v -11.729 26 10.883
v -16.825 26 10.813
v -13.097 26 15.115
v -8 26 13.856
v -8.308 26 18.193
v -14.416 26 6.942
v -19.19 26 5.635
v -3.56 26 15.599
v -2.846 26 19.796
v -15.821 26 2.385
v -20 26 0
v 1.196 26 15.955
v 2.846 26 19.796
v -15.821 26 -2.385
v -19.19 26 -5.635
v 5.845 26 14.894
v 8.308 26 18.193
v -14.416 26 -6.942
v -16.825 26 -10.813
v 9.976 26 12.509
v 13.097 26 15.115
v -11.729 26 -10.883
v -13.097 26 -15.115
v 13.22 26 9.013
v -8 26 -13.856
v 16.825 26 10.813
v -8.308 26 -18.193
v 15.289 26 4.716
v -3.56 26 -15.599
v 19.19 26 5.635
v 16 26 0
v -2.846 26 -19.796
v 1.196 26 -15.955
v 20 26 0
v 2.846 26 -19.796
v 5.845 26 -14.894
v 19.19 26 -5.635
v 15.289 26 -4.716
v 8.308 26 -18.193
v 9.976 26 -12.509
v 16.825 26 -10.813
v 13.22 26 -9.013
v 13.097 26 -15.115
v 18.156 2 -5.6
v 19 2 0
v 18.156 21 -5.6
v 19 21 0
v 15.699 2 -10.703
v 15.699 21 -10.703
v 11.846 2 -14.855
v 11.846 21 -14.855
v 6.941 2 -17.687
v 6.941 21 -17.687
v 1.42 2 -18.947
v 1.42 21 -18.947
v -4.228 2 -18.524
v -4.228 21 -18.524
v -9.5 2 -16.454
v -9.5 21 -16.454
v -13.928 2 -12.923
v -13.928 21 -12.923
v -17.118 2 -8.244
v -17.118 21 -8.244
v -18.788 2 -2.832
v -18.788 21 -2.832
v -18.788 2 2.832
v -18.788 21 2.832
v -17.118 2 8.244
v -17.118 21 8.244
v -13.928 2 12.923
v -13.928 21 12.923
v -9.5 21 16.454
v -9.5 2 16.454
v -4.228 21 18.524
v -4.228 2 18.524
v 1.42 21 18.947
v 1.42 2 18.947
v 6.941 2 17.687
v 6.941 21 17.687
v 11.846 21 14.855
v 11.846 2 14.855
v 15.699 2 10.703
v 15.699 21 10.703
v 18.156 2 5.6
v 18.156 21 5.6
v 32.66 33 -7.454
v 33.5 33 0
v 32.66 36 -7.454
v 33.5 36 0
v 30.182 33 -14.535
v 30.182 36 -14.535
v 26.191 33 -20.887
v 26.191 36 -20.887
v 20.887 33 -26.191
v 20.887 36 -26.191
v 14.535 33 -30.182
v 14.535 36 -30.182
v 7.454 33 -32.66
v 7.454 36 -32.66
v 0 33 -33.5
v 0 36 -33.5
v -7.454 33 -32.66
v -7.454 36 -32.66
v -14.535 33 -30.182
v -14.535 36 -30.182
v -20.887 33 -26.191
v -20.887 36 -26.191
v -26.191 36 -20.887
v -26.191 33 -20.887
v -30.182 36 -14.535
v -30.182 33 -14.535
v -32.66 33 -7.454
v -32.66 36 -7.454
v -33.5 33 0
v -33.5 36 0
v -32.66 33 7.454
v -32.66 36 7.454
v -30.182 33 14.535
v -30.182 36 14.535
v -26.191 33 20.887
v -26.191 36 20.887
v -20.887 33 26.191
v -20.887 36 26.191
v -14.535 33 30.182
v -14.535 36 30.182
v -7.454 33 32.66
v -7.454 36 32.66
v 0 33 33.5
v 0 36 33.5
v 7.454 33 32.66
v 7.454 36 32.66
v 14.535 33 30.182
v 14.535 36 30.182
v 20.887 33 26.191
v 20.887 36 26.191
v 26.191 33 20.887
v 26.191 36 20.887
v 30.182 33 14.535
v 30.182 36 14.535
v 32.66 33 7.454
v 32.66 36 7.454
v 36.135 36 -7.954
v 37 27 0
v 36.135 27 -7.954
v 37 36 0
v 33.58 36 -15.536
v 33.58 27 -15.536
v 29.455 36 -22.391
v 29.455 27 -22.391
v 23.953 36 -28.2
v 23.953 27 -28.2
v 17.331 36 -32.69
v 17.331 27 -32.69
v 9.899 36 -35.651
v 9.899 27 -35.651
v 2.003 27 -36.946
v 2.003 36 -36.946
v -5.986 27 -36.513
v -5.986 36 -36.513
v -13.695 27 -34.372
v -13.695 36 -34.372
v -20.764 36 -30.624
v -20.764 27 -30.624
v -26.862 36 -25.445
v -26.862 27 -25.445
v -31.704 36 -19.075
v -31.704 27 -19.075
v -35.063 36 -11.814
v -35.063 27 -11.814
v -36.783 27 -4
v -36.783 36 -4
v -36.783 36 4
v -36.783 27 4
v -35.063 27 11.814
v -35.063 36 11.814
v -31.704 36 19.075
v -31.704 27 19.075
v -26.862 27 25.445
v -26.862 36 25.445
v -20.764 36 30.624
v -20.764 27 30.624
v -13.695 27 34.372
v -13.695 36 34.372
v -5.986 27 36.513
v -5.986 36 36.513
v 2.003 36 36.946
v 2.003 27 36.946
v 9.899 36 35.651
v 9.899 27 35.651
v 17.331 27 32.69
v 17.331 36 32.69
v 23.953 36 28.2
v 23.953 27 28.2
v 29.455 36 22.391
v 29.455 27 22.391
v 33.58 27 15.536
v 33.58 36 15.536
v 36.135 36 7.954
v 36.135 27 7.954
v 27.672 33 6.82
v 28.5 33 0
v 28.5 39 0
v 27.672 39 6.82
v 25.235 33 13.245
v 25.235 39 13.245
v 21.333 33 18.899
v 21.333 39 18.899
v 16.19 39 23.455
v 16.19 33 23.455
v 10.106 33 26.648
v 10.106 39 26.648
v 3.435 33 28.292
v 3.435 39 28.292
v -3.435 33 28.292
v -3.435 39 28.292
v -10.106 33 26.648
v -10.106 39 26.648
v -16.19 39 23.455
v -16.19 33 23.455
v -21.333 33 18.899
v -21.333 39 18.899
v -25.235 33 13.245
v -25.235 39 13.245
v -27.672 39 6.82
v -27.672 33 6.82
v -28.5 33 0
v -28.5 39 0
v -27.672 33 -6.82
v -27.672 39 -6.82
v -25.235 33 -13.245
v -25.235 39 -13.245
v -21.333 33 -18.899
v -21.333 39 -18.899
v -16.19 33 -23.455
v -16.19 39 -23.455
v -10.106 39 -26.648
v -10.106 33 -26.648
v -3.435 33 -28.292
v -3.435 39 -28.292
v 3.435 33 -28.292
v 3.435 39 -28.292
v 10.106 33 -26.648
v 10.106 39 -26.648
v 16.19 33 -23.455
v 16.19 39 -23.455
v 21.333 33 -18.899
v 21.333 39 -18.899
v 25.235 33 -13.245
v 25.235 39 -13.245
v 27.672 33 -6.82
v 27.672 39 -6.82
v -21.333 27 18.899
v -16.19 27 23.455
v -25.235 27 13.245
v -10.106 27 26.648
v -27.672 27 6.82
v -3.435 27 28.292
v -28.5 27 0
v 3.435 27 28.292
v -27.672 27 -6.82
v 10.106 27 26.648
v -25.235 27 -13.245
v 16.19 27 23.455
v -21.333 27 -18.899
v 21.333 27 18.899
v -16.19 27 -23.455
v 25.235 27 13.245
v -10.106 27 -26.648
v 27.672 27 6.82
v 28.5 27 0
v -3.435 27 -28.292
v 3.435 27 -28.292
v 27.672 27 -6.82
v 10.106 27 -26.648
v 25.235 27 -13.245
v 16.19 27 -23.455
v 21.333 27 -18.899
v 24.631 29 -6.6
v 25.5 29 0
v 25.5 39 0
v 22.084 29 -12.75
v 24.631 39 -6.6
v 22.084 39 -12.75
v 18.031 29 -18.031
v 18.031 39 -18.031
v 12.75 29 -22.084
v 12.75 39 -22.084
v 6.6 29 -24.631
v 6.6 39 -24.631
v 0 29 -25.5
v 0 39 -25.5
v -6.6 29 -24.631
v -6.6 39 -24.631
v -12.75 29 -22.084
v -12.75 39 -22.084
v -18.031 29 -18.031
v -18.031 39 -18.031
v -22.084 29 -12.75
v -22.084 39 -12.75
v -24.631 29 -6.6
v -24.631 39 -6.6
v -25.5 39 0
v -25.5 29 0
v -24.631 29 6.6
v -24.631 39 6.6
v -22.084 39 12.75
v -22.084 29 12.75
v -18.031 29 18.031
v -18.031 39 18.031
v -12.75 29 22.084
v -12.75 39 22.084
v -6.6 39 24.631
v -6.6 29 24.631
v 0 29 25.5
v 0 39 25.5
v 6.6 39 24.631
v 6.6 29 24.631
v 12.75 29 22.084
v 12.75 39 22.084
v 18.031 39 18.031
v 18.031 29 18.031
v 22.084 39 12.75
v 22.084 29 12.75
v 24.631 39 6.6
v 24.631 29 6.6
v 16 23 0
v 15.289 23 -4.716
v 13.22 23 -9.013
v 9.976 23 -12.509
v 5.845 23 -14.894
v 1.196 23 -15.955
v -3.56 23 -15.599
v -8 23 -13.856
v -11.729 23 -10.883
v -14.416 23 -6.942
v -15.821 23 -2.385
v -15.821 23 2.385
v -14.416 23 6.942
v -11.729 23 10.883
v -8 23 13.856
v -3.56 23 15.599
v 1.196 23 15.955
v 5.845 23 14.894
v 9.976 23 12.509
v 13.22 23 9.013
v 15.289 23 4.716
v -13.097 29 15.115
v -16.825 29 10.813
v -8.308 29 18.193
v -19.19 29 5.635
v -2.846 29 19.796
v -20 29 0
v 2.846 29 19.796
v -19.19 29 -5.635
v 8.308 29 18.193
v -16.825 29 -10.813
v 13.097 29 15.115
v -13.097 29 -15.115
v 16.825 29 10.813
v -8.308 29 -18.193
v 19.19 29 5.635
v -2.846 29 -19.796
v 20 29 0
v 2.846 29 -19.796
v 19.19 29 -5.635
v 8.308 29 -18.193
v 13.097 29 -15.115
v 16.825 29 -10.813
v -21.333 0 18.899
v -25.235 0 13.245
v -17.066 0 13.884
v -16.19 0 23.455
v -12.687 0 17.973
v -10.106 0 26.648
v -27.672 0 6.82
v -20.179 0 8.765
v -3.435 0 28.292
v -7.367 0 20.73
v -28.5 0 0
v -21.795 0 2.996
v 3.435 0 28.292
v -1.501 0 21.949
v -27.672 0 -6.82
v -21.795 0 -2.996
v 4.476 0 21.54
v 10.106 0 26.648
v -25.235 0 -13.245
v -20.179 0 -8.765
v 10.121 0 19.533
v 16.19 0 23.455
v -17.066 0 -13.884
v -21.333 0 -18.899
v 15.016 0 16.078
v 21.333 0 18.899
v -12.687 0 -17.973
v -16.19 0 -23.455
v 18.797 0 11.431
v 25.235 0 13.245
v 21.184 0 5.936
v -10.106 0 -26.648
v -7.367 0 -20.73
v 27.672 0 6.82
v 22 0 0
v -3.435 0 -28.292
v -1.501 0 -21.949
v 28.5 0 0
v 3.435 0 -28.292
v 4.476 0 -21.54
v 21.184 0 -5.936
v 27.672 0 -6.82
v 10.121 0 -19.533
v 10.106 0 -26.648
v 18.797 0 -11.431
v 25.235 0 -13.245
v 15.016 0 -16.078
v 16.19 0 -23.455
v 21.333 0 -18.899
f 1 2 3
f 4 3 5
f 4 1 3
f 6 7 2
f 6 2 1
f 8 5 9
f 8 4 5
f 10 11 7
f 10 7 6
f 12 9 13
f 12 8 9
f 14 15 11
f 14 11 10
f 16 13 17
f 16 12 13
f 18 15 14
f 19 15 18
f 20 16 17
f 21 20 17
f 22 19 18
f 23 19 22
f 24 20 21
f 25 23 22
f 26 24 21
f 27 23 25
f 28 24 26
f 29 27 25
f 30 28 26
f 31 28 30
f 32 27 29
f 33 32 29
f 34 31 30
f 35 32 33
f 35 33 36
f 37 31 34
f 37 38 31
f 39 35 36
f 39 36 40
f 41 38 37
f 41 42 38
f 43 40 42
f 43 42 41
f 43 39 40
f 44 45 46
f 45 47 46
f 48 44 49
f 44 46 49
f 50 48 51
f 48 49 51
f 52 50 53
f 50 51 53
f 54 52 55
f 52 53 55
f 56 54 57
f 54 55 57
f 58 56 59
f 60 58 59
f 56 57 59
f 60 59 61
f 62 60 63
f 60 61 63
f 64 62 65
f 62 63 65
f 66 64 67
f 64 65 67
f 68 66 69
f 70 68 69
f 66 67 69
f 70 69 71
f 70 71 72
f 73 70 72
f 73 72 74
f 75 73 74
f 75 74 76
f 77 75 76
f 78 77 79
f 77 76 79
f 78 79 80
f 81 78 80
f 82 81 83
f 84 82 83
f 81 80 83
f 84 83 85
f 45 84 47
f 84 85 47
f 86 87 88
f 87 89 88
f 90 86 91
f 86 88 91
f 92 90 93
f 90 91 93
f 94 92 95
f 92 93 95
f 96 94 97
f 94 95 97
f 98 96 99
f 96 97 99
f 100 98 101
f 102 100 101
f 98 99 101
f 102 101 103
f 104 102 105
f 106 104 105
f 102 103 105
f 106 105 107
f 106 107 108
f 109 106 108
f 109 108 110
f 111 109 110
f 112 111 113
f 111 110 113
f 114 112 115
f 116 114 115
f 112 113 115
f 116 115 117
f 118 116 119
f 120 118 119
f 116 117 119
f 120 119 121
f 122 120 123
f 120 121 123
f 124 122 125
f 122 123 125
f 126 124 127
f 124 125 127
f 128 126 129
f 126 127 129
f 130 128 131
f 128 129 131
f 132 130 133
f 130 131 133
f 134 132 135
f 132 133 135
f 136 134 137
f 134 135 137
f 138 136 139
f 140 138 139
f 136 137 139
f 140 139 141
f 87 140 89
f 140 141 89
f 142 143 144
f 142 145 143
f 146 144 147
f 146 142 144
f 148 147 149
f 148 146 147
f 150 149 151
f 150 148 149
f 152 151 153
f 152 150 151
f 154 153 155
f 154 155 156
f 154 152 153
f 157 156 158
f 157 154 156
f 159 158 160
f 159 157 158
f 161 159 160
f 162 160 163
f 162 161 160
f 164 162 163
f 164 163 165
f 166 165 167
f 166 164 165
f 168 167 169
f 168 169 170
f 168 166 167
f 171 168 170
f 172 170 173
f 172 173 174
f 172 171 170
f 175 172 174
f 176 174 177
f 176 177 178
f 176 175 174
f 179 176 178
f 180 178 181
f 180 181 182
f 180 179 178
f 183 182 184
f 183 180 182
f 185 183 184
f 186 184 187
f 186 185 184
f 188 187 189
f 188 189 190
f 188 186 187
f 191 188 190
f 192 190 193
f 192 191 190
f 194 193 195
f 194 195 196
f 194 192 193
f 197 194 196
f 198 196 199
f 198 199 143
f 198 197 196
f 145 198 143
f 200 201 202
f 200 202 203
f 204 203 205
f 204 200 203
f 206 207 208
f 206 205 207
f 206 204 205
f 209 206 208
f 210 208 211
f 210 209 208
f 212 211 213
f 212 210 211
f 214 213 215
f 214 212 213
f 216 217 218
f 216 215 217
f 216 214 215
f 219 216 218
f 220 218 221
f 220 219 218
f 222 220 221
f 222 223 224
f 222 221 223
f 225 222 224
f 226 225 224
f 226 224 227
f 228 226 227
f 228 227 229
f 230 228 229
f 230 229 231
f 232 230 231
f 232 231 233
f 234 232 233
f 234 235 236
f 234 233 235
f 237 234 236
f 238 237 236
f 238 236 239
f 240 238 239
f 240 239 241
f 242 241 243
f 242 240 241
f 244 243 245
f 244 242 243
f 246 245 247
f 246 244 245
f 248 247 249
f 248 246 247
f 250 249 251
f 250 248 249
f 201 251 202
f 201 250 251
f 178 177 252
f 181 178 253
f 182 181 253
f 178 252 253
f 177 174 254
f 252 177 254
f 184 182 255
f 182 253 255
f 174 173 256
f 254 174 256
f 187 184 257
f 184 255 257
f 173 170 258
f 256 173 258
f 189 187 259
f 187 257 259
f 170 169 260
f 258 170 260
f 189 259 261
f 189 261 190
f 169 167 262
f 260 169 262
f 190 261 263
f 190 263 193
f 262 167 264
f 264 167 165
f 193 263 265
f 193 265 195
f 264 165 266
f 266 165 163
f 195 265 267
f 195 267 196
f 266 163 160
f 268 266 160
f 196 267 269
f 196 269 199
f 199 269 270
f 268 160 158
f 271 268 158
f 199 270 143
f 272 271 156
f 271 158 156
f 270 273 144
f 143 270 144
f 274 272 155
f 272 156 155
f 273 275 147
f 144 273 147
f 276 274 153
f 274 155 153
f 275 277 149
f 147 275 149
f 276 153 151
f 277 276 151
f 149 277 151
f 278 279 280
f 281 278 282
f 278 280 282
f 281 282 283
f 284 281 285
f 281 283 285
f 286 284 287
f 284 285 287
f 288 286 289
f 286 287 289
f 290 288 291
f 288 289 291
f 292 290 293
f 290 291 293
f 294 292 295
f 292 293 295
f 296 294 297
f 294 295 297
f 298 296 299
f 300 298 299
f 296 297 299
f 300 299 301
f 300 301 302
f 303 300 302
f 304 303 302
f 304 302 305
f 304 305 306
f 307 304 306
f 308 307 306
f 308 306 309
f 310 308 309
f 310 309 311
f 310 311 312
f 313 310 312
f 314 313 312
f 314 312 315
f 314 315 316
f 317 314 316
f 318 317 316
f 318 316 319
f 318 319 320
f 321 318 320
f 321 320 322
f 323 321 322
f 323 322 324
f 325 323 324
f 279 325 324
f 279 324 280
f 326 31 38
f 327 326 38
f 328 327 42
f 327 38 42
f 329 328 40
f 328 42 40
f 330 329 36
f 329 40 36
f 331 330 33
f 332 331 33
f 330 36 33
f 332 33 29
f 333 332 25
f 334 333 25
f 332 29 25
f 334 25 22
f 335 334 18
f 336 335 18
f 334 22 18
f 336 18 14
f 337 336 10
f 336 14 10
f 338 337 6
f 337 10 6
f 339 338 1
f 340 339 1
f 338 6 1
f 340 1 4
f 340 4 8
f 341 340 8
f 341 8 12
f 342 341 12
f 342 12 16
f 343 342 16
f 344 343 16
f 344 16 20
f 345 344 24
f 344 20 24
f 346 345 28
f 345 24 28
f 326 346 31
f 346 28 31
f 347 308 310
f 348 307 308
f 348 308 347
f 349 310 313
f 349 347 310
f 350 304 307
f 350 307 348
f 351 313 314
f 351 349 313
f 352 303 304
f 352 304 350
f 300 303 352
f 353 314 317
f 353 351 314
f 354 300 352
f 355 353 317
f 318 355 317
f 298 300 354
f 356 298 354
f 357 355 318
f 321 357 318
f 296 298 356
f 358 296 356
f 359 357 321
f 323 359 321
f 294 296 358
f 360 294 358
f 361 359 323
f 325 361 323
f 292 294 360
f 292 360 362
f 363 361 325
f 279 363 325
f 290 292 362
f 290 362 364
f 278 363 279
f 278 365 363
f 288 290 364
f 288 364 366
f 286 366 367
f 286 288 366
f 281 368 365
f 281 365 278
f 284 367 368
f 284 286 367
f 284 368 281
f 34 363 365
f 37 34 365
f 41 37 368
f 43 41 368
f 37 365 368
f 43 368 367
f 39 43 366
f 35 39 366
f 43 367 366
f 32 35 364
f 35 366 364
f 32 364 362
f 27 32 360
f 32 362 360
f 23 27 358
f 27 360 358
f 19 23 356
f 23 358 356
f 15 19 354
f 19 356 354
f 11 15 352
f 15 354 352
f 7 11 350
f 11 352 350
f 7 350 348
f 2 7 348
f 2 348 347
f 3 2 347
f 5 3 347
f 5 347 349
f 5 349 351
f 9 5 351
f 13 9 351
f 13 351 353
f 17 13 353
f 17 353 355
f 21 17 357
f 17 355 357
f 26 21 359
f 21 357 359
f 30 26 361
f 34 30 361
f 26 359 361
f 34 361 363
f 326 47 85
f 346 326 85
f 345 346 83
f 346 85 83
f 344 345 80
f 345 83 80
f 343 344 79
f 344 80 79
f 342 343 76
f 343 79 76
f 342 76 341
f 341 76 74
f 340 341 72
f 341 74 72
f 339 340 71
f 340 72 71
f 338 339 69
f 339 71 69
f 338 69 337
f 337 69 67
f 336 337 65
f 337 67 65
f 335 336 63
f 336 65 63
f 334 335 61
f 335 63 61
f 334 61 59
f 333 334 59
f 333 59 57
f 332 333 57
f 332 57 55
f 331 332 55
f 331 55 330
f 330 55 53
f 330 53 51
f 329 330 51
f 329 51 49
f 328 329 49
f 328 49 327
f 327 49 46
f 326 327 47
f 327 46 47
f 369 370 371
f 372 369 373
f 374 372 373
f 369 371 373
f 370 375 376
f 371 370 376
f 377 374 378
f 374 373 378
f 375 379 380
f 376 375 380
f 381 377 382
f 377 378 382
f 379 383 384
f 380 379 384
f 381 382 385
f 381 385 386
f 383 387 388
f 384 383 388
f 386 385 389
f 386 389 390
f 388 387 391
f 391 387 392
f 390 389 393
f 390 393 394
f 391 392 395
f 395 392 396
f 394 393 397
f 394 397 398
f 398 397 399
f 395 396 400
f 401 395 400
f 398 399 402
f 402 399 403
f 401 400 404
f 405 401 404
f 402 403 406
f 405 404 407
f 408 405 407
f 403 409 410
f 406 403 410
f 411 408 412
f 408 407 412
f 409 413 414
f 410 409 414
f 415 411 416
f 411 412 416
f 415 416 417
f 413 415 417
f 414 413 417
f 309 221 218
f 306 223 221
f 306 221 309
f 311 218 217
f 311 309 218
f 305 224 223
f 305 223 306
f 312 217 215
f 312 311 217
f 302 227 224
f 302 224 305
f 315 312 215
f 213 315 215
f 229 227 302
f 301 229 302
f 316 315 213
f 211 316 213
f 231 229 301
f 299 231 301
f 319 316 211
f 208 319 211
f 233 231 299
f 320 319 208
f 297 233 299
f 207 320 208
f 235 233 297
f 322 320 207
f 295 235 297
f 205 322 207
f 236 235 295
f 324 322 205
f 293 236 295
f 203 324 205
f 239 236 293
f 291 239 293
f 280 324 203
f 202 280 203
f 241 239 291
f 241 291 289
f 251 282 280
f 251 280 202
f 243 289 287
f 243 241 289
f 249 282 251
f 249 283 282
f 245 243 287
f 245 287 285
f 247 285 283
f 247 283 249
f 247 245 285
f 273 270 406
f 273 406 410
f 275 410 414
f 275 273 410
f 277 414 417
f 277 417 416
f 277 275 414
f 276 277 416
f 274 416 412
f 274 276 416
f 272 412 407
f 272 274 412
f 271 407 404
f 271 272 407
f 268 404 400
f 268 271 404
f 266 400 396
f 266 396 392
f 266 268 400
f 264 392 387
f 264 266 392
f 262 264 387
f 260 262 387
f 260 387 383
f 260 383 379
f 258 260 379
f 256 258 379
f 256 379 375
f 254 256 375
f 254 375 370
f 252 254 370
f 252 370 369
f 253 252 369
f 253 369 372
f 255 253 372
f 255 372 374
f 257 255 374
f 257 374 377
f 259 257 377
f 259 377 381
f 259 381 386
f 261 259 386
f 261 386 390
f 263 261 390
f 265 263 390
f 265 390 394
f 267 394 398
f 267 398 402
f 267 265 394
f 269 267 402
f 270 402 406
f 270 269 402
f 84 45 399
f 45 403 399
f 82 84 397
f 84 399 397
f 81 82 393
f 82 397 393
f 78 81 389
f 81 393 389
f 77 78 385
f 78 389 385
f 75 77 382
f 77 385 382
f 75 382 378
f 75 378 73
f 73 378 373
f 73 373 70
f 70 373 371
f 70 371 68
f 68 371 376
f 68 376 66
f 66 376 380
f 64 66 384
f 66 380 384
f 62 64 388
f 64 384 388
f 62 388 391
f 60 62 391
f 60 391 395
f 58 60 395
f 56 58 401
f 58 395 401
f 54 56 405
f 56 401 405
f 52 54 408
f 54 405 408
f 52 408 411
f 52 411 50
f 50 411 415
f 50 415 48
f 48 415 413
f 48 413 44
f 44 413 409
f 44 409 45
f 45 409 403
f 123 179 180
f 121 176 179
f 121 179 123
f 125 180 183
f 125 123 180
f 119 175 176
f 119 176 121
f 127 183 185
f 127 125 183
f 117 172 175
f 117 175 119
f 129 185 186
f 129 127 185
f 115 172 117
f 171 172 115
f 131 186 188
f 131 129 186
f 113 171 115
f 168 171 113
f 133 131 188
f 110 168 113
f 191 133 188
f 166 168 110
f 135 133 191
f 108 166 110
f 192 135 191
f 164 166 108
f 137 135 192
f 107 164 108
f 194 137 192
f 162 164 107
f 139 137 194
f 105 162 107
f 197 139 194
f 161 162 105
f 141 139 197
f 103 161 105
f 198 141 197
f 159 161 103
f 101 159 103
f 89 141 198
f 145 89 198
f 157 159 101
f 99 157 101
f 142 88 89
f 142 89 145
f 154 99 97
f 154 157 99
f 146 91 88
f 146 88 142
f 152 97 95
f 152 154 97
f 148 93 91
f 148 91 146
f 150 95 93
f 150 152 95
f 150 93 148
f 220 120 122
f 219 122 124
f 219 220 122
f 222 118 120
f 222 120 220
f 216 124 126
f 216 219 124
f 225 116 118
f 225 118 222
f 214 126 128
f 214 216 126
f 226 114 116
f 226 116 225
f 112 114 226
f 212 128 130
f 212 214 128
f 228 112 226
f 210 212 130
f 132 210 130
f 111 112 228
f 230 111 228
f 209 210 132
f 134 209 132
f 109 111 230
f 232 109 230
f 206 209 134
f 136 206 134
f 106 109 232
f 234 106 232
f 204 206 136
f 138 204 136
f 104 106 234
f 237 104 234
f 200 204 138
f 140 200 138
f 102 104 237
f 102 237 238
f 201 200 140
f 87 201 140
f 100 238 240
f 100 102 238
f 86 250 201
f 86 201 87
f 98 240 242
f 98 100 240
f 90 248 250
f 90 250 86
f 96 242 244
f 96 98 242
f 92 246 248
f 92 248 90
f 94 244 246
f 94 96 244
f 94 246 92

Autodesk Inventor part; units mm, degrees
ref_plane "YZ Plane" through (0, 0, 0) normal (1, 0, 0) x (0, 1, 0)
ref_plane "XZ Plane" through (0, 0, 0) normal (0, 1, 0) x (-1, 0, 0)
ref_plane "XY Plane" through (0, 0, 0) normal (0, 0, 1) x (1, 0, 0)
sketch "Sketch1" plane through (0, 0, 0) normal (0, 0, 1) x (1, 0, 0)
  line L0 (0, 0) -> (28.5, 0) construction
  line L1 (28.5, 0) -> (28.5, 27)
  line L2 (0, 0) -> (19, 0) construction
  line L3 (19, 0) -> (22, 0) construction
  line L4 (28.5, 0) -> (22, 0)
  line L5 (19, 0) -> (19, 2) construction
  line L6 (19, 2) -> (22, 0)
  line L7 (19, 2) -> (19, 21)
  line L8 (19, 21) -> (16, 21) construction
  line L9 (16, 21) -> (16, 23) construction
  line L10 (16, 23) -> (19, 21)
  line L11 (16, 23) -> (16, 26)
  line L12 (16, 26) -> (20, 26)
  line L13 (20, 26) -> (20, 29)
  line L14 (20, 29) -> (25.5, 29)
  line L15 (25.5, 29) -> (25.5, 39)
  line L16 (25.5, 39) -> (28.5, 39)
  line L17 (28.5, 39) -> (28.5, 33)
  line L18 (28.5, 33) -> (33.5, 33)
  line L19 (33.5, 33) -> (33.5, 36)
  line L20 (28.5, 27) -> (37, 27)
  line L21 (37, 27) -> (37, 36)
  line L22 (37, 36) -> (33.5, 36)
  line L23 (0, 0) -> (0, 8.384) construction
  dimension "d0" = 28.5
  dimension "d1" = 27
  dimension "d2" = 19
  dimension "d3" = 3
  dimension "d4" = 2
  dimension "d5" = 21
  dimension "d6" = 3
  dimension "d7" = 2
  dimension "d8" = 3
  dimension "d17" = 3
  dimension "d18" = 5.5
  dimension "d19" = 4
  dimension "d20" = 10
  dimension "d21" = 3
  dimension "d22" = 6
  dimension "d23" = 5
  dimension "d24" = 3
  dimension "d25" = 8.5
revolve "Revolution1" add sketch "Sketch1" angle 360 about axis through (0, 0, 0) along (0, 1, 0)
properties part number "Body Cap Base Feature" material "Bronze, Soft Tin"
